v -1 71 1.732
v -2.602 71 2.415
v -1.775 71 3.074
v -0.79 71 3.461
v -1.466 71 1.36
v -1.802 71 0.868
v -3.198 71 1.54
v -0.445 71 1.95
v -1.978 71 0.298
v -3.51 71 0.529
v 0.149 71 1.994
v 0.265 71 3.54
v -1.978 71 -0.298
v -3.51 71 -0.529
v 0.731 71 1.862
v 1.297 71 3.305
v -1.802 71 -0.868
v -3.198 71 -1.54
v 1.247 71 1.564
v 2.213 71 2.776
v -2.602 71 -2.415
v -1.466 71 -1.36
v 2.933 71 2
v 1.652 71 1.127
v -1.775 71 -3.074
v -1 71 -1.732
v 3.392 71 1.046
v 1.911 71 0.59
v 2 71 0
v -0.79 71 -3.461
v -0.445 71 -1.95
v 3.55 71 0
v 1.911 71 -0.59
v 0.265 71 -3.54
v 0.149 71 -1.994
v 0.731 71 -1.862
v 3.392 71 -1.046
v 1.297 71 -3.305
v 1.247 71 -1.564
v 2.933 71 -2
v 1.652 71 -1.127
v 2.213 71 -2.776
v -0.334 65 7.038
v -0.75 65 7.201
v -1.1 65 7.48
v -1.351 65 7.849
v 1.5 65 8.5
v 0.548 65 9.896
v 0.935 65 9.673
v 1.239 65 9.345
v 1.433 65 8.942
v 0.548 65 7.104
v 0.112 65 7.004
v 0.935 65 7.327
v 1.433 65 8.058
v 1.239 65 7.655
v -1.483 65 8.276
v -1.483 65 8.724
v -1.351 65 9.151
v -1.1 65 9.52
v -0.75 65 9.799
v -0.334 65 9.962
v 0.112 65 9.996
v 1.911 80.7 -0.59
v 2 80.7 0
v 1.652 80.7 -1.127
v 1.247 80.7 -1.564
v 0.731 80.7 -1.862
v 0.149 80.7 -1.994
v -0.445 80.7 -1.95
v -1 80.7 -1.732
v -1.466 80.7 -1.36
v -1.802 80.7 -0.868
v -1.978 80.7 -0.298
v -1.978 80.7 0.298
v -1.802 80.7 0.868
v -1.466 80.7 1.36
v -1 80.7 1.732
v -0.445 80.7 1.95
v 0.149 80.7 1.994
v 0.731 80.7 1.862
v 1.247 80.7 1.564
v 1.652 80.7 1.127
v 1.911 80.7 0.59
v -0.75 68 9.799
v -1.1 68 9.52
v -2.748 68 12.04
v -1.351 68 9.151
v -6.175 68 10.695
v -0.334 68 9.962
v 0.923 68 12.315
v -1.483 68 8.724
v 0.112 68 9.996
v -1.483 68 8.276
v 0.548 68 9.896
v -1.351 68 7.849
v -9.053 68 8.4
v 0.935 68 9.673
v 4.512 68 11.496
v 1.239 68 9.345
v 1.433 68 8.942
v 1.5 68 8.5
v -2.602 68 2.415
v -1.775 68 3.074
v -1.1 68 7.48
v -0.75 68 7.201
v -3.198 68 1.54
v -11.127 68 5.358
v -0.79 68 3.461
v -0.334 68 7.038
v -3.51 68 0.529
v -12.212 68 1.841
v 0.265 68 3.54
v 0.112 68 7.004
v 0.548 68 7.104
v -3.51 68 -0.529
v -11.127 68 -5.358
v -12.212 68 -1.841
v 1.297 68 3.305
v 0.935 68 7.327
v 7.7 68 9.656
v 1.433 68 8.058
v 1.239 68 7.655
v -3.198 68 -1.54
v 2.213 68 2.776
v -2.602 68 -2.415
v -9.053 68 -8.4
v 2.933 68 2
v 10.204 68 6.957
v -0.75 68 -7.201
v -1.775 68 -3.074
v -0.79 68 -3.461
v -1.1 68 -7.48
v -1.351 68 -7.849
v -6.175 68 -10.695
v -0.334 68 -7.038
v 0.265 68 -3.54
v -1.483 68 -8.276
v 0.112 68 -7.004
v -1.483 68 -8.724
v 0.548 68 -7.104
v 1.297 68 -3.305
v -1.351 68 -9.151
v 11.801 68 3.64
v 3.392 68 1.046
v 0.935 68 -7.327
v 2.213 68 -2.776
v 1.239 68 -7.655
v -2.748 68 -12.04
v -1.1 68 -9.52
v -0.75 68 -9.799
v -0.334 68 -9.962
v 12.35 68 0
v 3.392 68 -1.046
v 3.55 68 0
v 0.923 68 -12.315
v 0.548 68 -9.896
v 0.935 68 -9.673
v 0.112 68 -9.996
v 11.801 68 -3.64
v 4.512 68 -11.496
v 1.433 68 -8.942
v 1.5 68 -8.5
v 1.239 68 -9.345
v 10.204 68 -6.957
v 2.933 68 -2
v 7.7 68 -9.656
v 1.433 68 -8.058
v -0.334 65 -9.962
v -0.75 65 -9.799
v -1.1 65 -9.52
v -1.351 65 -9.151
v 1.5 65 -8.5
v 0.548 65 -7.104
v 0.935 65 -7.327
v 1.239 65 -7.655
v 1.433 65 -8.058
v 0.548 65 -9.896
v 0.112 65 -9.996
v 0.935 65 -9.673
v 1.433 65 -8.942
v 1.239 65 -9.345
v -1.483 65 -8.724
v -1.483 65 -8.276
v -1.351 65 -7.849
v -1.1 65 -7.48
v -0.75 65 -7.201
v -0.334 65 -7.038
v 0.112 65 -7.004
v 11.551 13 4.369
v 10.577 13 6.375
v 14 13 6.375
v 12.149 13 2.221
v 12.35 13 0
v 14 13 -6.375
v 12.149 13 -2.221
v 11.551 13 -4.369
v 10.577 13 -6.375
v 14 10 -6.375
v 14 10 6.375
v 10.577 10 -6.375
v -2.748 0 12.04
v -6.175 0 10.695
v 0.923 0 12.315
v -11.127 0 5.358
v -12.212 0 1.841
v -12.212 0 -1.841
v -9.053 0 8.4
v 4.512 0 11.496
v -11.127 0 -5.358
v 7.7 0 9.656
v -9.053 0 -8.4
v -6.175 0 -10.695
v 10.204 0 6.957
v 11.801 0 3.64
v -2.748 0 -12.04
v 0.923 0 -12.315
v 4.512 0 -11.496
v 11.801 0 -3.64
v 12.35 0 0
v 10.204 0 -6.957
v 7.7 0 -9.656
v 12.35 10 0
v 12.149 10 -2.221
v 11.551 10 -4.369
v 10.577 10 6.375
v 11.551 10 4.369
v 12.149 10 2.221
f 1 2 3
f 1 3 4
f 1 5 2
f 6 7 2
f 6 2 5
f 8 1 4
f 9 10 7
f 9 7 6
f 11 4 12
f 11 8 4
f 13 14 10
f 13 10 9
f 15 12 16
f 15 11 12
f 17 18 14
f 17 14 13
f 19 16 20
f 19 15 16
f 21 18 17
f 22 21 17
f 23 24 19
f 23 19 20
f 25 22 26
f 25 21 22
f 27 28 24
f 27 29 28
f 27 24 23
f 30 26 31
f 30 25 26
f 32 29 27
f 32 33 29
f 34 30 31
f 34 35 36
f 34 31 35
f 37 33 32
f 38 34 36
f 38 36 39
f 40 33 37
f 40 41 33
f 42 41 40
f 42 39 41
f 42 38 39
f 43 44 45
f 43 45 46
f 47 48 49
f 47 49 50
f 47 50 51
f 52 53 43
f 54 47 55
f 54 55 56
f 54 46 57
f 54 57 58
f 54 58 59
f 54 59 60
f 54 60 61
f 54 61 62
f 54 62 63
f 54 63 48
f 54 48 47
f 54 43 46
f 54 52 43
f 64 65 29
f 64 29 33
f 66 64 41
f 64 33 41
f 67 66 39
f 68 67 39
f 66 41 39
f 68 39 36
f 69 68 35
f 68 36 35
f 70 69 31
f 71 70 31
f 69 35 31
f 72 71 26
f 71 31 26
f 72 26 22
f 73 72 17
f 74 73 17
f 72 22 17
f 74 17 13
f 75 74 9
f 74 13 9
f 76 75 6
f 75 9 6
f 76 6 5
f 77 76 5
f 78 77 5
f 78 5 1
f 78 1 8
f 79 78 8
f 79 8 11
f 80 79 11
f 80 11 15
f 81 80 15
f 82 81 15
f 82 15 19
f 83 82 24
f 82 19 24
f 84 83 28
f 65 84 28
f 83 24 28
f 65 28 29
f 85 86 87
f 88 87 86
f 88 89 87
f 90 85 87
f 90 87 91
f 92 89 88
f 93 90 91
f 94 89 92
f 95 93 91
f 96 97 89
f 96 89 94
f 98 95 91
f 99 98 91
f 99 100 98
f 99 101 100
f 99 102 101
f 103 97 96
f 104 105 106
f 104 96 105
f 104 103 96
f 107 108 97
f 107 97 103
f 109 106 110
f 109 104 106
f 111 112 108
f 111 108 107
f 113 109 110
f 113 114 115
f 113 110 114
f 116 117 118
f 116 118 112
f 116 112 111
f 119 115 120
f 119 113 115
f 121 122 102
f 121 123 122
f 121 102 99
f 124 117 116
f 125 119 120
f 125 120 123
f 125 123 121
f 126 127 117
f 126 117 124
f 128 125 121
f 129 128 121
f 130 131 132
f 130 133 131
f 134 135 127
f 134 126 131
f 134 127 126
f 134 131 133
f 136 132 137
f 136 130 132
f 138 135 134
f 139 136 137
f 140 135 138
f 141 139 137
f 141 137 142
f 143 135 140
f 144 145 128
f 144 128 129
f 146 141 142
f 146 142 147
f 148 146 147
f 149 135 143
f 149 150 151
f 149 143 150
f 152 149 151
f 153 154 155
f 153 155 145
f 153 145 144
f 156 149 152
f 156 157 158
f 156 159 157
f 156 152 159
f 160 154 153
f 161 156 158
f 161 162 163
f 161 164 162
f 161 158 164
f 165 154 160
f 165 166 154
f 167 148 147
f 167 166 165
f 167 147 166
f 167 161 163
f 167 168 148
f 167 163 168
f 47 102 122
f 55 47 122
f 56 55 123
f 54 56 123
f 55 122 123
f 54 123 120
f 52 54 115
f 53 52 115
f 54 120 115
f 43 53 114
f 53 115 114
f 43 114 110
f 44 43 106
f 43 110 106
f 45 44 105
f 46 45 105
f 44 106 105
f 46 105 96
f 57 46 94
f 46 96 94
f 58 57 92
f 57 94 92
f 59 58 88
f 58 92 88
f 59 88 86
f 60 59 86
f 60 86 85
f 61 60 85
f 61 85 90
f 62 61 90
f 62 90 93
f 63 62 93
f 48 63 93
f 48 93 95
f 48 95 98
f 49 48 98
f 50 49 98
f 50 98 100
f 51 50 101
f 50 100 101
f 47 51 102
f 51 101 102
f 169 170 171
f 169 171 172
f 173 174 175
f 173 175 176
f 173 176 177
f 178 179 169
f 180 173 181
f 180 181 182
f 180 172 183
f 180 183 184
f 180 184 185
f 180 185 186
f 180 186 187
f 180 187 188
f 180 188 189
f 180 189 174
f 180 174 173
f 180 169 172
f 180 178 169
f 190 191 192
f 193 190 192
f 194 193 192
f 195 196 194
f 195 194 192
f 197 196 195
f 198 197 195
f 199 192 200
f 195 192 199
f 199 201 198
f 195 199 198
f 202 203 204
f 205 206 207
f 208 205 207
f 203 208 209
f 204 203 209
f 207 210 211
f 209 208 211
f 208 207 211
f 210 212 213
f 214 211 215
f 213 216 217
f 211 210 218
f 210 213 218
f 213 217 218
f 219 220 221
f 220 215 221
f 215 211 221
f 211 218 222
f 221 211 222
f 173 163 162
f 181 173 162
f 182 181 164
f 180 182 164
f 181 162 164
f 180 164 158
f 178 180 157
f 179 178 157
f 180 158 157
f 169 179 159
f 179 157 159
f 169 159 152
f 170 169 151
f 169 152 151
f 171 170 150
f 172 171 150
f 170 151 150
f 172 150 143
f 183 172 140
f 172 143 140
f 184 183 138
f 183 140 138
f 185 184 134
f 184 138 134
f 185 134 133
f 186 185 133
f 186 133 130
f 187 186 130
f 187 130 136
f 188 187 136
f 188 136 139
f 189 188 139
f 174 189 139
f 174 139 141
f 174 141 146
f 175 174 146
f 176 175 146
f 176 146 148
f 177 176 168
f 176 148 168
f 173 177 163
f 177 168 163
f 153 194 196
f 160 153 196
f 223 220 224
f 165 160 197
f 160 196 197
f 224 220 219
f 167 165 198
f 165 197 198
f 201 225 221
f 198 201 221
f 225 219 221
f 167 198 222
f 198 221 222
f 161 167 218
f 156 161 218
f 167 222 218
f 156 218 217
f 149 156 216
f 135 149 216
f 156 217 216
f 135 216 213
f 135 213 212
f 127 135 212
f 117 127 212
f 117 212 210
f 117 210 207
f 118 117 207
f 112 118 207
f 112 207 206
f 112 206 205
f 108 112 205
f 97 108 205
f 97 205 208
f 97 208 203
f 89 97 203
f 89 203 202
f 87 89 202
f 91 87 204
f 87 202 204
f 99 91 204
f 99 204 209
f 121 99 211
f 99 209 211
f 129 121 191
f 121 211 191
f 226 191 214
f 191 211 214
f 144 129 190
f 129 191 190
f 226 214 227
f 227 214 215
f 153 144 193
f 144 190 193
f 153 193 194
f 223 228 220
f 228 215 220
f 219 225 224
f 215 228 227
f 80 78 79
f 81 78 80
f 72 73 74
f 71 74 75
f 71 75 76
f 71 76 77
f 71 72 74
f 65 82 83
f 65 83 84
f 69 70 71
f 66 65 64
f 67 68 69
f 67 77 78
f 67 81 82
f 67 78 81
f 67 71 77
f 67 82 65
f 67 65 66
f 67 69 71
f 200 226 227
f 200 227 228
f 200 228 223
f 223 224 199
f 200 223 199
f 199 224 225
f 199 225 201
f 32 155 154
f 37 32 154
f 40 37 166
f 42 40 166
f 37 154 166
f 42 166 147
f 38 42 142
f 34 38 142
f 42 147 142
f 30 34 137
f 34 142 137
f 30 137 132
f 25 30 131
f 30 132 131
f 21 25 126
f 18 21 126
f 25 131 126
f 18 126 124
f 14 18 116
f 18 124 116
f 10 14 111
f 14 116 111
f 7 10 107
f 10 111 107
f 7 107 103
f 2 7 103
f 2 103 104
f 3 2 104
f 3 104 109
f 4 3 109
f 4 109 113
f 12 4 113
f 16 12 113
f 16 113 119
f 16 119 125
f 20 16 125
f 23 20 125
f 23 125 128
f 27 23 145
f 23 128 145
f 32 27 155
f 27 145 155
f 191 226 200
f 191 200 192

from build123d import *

# Parameters (mm, degrees)
SKETCH1_R           = 12.35
BOSS_EXTRUDE1_DEPTH = 68
SKETCH2_R           = 3.55
BOSS_EXTRUDE2_DEPTH = 3
SKETCH3_R           = 2
BOSS_EXTRUDE3_DEPTH = 9.7
SKETCH5_W           = 12.75
SKETCH5_H           = 3
BOSS_EXTRUDE4_DEPTH = 14
SKETCH4_R           = 1.5
CUT_EXTRUDE1_DEPTH  = 3


with BuildPart() as part:
    # Sketch1 → Boss-Extrude1 (new body)
    with BuildSketch(Plane(origin=(0, 0, 0), x_dir=(1, 0, 0), z_dir=(0, 1, 0))):
        Circle(SKETCH1_R)
    extrude(amount=BOSS_EXTRUDE1_DEPTH)

    # Sketch2 → Boss-Extrude2 (add)
    with BuildSketch(Plane(origin=(0, 68, 0), x_dir=(1, 0, 0), z_dir=(0, 1, 0))):
        Circle(SKETCH2_R)
    extrude(amount=BOSS_EXTRUDE2_DEPTH)

    # Sketch3 → Boss-Extrude3 (add)
    with BuildSketch(Plane(origin=(0, 71, 0), x_dir=(1, 0, 0), z_dir=(0, 1, 0))):
        Circle(SKETCH3_R)
    extrude(amount=BOSS_EXTRUDE3_DEPTH)

    # Sketch5 → Boss-Extrude4 (add)
    with BuildSketch(Plane(origin=(0, 0, 0), x_dir=(0, 0, -1), z_dir=(1, 0, 0))):
        with Locations((0, 11.5)):
            Rectangle(SKETCH5_W, SKETCH5_H)
    extrude(amount=BOSS_EXTRUDE4_DEPTH)

    # Sketch4 → Cut-Extrude1 (cut)
    with BuildSketch(Plane(origin=(0, 68, 0), x_dir=(1, 0, 0), z_dir=(0, 1, 0))):
        with Locations((0, 8.5)):
            Circle(SKETCH4_R)
        with Locations((0, -8.5)):
            Circle(SKETCH4_R)
    extrude(amount=-CUT_EXTRUDE1_DEPTH, mode=Mode.SUBTRACT)


solid = part.part
